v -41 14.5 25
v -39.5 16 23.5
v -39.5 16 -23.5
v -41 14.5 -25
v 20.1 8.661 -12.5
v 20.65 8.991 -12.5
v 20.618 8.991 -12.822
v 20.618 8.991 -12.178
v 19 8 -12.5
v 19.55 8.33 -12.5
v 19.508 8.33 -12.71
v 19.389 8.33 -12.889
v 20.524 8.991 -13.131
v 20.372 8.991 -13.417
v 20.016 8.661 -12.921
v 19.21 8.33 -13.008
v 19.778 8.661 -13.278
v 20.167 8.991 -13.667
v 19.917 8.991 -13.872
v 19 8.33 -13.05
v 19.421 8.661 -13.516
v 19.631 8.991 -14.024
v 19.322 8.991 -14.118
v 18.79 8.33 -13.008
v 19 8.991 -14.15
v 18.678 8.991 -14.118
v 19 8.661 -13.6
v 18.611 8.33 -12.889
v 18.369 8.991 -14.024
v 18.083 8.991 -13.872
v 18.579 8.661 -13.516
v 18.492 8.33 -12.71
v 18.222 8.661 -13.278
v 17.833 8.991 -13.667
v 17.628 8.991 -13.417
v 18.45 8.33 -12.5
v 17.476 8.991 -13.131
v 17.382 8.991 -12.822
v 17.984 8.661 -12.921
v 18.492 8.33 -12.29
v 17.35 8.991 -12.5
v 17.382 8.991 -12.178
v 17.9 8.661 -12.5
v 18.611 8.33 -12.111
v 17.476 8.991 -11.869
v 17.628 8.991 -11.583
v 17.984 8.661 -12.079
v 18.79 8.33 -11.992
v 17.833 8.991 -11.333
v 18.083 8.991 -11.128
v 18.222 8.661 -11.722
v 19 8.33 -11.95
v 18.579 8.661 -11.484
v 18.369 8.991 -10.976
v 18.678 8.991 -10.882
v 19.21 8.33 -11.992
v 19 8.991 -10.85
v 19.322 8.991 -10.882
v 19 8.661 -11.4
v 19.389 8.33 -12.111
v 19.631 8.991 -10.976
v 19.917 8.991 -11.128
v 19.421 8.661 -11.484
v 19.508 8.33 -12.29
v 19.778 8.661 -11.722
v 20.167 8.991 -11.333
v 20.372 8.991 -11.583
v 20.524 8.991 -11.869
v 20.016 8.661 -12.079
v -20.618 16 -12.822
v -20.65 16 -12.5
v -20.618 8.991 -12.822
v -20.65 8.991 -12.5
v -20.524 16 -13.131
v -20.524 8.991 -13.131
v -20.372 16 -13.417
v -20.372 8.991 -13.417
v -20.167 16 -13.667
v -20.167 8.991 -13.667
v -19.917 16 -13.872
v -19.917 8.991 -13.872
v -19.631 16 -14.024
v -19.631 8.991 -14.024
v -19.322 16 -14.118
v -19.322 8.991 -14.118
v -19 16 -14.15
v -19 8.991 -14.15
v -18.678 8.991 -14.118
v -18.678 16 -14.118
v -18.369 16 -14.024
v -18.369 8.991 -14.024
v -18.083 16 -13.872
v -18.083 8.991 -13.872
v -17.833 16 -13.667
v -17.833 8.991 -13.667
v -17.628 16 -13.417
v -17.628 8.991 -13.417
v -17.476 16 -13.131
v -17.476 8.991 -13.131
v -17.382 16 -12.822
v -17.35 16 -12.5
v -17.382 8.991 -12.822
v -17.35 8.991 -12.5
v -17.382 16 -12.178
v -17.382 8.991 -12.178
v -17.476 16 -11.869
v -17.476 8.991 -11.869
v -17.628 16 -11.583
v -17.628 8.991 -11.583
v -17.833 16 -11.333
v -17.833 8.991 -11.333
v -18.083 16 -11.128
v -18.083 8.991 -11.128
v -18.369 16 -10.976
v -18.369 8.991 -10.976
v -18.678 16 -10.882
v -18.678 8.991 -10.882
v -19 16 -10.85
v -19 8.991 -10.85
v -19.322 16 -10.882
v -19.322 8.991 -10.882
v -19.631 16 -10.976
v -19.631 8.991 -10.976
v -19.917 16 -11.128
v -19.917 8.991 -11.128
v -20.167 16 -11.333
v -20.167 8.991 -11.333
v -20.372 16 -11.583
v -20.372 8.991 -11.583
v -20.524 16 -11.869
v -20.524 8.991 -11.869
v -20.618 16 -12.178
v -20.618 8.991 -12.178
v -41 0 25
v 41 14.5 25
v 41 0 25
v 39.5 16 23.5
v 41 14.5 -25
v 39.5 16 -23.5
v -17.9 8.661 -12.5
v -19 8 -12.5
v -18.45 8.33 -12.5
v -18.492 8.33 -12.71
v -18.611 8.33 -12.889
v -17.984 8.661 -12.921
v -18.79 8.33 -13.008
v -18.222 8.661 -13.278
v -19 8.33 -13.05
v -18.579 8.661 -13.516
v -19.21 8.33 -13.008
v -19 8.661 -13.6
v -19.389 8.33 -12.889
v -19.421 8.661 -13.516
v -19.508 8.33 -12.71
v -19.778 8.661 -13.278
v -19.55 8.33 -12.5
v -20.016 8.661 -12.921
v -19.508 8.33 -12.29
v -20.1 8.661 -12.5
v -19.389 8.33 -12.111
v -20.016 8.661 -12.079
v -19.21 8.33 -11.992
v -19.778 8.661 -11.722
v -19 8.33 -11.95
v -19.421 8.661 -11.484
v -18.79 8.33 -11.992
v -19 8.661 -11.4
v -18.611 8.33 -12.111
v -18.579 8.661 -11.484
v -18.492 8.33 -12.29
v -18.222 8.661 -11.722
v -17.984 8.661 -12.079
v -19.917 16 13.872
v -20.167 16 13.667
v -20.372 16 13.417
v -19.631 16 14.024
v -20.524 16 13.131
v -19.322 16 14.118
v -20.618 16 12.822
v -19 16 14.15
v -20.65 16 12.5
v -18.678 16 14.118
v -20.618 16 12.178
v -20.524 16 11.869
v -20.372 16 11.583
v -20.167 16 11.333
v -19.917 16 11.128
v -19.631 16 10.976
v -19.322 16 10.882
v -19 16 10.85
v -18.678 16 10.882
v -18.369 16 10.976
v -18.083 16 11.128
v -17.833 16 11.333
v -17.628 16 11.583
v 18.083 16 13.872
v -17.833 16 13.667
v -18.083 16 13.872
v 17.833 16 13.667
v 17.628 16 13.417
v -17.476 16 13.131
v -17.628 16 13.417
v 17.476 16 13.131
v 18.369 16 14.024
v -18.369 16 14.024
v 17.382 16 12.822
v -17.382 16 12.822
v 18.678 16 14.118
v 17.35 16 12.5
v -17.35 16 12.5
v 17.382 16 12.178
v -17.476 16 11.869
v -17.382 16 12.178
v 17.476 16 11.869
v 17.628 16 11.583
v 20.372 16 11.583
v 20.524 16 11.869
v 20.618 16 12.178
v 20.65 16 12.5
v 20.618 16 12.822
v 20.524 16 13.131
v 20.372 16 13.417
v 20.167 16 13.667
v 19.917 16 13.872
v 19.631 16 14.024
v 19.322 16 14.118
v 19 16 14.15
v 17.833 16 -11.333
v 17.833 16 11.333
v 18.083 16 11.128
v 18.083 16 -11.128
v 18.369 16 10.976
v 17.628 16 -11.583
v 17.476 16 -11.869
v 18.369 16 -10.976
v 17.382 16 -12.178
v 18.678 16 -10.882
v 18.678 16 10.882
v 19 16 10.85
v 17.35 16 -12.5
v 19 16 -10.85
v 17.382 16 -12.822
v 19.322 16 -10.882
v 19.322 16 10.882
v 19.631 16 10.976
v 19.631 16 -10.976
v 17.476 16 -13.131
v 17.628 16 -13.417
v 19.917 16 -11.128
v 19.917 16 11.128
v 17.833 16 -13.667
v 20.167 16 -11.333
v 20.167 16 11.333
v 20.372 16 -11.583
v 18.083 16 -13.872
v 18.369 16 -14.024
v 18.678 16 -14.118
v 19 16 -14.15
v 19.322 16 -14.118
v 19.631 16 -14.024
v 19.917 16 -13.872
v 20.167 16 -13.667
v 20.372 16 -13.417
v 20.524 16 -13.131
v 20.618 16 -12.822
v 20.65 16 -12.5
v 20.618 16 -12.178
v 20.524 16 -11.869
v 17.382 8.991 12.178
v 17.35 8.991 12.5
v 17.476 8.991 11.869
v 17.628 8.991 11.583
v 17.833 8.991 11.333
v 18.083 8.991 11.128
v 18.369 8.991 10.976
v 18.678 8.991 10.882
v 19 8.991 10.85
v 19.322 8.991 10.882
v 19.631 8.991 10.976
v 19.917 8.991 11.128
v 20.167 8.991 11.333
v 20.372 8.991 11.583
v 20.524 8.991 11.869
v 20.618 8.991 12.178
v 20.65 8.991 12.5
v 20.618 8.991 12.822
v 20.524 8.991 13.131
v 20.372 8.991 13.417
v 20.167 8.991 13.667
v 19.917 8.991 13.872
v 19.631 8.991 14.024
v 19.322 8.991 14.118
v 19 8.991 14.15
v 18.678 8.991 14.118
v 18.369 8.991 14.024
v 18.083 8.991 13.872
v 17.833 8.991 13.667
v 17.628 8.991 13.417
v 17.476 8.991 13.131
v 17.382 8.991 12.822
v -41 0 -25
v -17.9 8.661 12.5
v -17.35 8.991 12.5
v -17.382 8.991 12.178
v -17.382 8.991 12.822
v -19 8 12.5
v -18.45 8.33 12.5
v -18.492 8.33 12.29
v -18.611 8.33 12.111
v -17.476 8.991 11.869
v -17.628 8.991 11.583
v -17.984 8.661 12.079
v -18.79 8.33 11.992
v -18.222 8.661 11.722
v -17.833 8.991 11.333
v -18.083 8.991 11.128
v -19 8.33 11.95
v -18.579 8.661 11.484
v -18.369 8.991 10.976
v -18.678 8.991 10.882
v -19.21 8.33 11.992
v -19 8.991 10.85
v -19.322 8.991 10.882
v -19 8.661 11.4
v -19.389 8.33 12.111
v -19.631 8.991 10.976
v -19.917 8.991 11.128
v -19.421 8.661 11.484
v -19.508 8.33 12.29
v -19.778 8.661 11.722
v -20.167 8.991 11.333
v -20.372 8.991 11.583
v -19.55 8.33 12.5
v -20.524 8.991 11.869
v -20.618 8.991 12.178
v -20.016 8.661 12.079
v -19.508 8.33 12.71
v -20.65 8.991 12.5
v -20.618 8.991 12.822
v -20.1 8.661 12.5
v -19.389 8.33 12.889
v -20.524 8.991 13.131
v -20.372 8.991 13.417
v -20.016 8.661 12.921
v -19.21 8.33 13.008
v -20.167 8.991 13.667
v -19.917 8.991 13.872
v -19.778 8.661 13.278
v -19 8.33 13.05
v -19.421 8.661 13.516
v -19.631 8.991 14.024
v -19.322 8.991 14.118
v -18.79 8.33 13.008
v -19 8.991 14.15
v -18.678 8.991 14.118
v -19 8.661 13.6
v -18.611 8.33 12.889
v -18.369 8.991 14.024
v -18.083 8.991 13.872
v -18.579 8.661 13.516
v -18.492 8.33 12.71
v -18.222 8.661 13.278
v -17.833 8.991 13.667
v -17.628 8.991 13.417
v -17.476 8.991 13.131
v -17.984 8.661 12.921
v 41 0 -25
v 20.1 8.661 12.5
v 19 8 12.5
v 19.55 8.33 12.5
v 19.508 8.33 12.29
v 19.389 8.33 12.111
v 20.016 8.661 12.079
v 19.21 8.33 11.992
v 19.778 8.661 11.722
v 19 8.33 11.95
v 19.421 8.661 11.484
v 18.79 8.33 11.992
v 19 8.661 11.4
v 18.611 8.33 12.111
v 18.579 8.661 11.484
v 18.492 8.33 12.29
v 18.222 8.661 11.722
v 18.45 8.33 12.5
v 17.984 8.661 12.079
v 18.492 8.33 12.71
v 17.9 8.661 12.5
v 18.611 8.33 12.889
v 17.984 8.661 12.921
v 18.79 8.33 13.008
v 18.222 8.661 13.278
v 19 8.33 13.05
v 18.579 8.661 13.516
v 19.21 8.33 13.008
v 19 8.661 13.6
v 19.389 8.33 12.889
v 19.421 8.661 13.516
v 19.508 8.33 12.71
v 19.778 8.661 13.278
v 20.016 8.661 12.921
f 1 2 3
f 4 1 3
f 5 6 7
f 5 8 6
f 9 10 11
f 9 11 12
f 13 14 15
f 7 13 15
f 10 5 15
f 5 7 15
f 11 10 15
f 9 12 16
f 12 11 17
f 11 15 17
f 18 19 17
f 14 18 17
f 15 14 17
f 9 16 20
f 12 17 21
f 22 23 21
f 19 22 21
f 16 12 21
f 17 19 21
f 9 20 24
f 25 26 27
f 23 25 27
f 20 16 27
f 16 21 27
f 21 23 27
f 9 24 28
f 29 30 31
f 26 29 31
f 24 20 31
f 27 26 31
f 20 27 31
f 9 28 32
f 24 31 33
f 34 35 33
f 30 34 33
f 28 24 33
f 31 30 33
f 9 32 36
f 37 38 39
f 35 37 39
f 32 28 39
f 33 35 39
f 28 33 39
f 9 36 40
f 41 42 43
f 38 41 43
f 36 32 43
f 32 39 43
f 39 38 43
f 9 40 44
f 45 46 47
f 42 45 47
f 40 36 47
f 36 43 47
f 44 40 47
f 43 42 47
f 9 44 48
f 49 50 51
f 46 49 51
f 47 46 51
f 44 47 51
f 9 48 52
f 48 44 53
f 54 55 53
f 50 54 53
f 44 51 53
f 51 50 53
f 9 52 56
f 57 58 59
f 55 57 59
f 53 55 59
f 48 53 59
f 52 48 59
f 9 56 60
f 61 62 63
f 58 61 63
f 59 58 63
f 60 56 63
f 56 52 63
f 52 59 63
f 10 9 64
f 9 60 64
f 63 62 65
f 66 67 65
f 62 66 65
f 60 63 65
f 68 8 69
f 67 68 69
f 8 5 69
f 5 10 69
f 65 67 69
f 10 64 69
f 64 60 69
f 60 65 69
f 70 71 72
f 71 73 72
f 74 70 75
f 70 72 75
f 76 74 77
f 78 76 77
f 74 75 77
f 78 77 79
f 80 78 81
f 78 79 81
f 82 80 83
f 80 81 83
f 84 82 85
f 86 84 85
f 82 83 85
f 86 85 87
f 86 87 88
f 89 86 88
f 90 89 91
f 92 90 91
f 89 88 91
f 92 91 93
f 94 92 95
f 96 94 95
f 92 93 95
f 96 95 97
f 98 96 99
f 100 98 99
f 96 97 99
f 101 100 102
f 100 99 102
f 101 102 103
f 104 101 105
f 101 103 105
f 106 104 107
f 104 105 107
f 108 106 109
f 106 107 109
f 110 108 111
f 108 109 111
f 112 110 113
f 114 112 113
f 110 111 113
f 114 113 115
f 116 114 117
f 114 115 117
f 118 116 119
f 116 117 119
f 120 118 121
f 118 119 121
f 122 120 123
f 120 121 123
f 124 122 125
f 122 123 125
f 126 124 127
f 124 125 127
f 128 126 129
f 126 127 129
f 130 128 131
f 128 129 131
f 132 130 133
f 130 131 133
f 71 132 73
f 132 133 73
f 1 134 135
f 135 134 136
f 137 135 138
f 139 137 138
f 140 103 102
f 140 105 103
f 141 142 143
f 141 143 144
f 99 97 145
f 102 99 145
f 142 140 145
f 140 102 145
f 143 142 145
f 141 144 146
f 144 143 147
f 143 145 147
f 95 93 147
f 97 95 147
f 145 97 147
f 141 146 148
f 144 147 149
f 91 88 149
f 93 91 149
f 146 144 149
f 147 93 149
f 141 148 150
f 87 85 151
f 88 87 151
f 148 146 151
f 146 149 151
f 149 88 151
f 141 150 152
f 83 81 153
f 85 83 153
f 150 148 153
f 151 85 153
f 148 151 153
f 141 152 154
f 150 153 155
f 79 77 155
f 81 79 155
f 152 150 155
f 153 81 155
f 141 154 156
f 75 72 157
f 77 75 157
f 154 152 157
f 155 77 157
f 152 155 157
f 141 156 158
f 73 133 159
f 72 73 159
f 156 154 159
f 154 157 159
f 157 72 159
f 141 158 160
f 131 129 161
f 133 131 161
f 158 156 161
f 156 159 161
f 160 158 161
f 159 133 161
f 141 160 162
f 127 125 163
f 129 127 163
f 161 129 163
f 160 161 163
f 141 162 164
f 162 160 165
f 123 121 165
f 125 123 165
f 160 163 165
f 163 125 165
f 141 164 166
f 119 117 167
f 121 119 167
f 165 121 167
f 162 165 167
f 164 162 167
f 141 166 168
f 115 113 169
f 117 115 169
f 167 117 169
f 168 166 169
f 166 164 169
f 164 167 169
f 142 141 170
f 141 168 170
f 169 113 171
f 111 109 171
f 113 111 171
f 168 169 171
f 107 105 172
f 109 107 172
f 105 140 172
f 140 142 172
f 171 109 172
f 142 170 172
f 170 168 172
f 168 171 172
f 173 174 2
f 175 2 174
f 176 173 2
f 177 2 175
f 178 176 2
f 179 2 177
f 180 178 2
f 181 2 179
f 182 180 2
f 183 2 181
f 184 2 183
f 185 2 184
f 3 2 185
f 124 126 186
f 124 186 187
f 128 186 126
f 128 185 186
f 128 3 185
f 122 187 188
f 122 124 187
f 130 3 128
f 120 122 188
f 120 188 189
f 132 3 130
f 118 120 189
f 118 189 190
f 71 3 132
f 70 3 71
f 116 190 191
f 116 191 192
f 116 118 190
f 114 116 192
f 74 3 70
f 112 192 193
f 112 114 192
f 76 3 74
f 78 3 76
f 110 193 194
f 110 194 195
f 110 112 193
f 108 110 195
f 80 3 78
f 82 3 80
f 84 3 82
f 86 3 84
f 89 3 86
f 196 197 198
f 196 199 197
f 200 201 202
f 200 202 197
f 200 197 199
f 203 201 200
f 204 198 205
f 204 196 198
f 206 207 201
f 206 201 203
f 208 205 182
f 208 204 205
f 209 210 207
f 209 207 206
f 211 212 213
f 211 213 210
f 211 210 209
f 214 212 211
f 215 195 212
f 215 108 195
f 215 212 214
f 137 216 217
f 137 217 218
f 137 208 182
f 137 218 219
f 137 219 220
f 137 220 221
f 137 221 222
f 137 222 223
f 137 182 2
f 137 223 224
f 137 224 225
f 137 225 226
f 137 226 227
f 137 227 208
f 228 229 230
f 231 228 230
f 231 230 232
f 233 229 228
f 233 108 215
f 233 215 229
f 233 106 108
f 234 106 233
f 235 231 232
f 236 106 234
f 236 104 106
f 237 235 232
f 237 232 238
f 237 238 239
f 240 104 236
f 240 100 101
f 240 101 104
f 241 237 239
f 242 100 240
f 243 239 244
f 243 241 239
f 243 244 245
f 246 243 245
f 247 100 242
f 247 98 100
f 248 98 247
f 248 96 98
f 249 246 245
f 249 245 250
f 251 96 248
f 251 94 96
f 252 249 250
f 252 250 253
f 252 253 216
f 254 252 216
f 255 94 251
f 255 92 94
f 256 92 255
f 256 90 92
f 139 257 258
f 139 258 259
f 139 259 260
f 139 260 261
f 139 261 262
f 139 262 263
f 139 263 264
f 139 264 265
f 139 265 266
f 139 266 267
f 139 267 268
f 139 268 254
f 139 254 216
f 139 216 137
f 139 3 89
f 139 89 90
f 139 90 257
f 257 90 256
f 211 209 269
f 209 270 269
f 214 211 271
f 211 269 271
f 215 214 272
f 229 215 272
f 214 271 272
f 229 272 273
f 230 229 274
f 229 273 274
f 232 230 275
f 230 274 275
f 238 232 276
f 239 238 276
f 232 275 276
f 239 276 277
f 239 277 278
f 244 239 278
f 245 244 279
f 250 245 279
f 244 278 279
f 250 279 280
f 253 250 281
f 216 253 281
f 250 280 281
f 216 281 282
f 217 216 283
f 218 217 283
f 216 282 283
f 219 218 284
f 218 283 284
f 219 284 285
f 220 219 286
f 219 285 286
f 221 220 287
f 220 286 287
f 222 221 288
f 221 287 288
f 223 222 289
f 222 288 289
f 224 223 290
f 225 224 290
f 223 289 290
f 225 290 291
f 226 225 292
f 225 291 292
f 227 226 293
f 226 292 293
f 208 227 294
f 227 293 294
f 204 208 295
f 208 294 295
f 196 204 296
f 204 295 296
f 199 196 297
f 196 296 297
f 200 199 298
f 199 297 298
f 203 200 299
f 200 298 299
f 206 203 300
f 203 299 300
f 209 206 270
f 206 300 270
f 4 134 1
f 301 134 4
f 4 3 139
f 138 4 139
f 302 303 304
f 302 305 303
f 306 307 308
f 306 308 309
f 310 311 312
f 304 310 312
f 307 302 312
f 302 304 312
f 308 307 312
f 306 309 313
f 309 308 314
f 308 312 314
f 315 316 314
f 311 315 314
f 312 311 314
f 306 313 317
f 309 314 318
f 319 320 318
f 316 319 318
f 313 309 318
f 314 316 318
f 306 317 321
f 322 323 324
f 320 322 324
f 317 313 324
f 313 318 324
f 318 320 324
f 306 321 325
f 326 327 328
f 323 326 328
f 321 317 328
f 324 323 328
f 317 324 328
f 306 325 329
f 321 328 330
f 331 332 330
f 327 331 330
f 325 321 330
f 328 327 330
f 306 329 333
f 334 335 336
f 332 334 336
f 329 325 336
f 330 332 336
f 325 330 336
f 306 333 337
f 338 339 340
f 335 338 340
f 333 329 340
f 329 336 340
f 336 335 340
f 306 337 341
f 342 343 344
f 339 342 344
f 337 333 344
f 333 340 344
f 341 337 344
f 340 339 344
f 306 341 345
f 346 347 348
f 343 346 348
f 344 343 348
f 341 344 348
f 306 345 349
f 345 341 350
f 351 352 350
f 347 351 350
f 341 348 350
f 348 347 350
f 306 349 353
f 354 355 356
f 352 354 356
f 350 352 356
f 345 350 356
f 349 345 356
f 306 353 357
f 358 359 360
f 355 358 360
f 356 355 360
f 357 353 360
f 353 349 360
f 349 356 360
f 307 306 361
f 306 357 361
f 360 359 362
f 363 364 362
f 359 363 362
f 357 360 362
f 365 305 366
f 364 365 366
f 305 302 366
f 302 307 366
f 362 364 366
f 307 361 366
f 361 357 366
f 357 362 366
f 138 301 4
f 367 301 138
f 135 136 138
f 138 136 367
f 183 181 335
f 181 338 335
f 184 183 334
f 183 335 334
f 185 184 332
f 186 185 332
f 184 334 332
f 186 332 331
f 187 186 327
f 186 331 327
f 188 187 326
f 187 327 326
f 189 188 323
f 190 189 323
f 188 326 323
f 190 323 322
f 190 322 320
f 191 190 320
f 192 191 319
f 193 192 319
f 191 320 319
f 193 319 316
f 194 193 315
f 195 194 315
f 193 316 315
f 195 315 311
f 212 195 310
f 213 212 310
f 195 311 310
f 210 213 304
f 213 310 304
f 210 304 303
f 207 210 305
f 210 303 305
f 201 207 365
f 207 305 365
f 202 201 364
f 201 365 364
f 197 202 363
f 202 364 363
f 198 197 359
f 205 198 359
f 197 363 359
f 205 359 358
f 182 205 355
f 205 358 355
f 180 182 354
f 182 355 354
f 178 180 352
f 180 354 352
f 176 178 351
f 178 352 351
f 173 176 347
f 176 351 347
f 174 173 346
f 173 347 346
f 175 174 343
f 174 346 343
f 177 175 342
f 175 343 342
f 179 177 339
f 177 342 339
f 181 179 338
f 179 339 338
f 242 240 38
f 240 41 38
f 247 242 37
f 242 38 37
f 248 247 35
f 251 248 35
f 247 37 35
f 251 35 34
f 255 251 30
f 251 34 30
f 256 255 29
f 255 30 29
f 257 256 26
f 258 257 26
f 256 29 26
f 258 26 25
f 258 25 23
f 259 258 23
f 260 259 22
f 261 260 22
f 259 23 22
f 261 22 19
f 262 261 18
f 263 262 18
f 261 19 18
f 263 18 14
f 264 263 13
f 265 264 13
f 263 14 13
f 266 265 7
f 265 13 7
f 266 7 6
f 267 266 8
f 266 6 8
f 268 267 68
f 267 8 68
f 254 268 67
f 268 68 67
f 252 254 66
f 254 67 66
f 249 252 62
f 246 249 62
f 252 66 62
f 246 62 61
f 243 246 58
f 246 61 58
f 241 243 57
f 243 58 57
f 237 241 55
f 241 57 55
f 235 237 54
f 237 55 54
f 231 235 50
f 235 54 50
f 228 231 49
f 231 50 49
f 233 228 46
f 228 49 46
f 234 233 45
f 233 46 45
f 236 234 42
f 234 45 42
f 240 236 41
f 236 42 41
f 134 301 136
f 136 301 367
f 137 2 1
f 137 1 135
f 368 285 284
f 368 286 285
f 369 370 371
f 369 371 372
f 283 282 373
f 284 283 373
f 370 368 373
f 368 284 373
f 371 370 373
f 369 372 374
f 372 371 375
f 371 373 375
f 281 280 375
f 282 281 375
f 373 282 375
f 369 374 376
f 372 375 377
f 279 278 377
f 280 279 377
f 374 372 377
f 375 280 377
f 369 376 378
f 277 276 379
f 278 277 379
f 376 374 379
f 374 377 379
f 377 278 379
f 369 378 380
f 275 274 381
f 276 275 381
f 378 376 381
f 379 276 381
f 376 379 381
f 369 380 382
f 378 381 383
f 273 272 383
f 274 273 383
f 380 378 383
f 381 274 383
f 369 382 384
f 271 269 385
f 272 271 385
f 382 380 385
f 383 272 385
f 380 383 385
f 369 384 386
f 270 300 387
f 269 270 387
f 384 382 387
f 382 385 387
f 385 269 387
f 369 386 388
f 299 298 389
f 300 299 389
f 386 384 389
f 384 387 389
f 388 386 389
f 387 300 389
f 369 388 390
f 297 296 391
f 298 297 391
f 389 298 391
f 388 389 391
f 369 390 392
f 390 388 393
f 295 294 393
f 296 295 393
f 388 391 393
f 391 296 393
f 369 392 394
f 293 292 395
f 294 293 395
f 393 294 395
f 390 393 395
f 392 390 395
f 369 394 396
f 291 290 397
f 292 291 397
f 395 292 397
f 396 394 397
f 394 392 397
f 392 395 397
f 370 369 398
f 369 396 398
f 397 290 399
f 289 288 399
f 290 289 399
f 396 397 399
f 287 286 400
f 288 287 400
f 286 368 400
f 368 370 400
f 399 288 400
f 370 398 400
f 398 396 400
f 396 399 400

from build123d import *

# Parameters (mm, degrees)
SKETCH1_W             = 82
SKETCH1_H             = 50
BOSS_EXTRUDE1_DEPTH   = 16
M4_TAPPED_HOLE1_D     = 3.3
M4_TAPPED_HOLE1_DEPTH = 7.008579979
M4_TAPPED_HOLE1_TIP   = 0.991420021
CHAMFER1_SIZE         = 1.5


with BuildPart() as part:
    # Sketch1 → Boss-Extrude1 (new body)
    with BuildSketch(Plane(origin=(0, 0, 0), x_dir=(1, 0, 0), z_dir=(0, 1, 0))):
        Rectangle(SKETCH1_W, SKETCH1_H)
    extrude(amount=BOSS_EXTRUDE1_DEPTH)

    # M4 Tapped Hole1
    with Locations(Plane(origin=(0, 16, 0), x_dir=(1, 0, 0), z_dir=(0, 1, 0))):
        with Locations((-19, 12.5), (19, 12.5), (19, -12.5), (-19, -12.5)):
            Hole(M4_TAPPED_HOLE1_D / 2, depth=M4_TAPPED_HOLE1_DEPTH)
            with Locations((0, 0, -(M4_TAPPED_HOLE1_DEPTH + M4_TAPPED_HOLE1_TIP / 2))):  # 118° drill point
                Cone(0, M4_TAPPED_HOLE1_D / 2, M4_TAPPED_HOLE1_TIP, mode=Mode.SUBTRACT)

    # Chamfer1
    chamfer1_edges = [part.edges().sort_by_distance(p)[0] for p in [
        (-41, 16, 0),
        (0, 16, 25),
        (41, 16, 0),
        (0, 16, -25),
    ]]
    chamfer(chamfer1_edges, length=CHAMFER1_SIZE)


solid = part.part
